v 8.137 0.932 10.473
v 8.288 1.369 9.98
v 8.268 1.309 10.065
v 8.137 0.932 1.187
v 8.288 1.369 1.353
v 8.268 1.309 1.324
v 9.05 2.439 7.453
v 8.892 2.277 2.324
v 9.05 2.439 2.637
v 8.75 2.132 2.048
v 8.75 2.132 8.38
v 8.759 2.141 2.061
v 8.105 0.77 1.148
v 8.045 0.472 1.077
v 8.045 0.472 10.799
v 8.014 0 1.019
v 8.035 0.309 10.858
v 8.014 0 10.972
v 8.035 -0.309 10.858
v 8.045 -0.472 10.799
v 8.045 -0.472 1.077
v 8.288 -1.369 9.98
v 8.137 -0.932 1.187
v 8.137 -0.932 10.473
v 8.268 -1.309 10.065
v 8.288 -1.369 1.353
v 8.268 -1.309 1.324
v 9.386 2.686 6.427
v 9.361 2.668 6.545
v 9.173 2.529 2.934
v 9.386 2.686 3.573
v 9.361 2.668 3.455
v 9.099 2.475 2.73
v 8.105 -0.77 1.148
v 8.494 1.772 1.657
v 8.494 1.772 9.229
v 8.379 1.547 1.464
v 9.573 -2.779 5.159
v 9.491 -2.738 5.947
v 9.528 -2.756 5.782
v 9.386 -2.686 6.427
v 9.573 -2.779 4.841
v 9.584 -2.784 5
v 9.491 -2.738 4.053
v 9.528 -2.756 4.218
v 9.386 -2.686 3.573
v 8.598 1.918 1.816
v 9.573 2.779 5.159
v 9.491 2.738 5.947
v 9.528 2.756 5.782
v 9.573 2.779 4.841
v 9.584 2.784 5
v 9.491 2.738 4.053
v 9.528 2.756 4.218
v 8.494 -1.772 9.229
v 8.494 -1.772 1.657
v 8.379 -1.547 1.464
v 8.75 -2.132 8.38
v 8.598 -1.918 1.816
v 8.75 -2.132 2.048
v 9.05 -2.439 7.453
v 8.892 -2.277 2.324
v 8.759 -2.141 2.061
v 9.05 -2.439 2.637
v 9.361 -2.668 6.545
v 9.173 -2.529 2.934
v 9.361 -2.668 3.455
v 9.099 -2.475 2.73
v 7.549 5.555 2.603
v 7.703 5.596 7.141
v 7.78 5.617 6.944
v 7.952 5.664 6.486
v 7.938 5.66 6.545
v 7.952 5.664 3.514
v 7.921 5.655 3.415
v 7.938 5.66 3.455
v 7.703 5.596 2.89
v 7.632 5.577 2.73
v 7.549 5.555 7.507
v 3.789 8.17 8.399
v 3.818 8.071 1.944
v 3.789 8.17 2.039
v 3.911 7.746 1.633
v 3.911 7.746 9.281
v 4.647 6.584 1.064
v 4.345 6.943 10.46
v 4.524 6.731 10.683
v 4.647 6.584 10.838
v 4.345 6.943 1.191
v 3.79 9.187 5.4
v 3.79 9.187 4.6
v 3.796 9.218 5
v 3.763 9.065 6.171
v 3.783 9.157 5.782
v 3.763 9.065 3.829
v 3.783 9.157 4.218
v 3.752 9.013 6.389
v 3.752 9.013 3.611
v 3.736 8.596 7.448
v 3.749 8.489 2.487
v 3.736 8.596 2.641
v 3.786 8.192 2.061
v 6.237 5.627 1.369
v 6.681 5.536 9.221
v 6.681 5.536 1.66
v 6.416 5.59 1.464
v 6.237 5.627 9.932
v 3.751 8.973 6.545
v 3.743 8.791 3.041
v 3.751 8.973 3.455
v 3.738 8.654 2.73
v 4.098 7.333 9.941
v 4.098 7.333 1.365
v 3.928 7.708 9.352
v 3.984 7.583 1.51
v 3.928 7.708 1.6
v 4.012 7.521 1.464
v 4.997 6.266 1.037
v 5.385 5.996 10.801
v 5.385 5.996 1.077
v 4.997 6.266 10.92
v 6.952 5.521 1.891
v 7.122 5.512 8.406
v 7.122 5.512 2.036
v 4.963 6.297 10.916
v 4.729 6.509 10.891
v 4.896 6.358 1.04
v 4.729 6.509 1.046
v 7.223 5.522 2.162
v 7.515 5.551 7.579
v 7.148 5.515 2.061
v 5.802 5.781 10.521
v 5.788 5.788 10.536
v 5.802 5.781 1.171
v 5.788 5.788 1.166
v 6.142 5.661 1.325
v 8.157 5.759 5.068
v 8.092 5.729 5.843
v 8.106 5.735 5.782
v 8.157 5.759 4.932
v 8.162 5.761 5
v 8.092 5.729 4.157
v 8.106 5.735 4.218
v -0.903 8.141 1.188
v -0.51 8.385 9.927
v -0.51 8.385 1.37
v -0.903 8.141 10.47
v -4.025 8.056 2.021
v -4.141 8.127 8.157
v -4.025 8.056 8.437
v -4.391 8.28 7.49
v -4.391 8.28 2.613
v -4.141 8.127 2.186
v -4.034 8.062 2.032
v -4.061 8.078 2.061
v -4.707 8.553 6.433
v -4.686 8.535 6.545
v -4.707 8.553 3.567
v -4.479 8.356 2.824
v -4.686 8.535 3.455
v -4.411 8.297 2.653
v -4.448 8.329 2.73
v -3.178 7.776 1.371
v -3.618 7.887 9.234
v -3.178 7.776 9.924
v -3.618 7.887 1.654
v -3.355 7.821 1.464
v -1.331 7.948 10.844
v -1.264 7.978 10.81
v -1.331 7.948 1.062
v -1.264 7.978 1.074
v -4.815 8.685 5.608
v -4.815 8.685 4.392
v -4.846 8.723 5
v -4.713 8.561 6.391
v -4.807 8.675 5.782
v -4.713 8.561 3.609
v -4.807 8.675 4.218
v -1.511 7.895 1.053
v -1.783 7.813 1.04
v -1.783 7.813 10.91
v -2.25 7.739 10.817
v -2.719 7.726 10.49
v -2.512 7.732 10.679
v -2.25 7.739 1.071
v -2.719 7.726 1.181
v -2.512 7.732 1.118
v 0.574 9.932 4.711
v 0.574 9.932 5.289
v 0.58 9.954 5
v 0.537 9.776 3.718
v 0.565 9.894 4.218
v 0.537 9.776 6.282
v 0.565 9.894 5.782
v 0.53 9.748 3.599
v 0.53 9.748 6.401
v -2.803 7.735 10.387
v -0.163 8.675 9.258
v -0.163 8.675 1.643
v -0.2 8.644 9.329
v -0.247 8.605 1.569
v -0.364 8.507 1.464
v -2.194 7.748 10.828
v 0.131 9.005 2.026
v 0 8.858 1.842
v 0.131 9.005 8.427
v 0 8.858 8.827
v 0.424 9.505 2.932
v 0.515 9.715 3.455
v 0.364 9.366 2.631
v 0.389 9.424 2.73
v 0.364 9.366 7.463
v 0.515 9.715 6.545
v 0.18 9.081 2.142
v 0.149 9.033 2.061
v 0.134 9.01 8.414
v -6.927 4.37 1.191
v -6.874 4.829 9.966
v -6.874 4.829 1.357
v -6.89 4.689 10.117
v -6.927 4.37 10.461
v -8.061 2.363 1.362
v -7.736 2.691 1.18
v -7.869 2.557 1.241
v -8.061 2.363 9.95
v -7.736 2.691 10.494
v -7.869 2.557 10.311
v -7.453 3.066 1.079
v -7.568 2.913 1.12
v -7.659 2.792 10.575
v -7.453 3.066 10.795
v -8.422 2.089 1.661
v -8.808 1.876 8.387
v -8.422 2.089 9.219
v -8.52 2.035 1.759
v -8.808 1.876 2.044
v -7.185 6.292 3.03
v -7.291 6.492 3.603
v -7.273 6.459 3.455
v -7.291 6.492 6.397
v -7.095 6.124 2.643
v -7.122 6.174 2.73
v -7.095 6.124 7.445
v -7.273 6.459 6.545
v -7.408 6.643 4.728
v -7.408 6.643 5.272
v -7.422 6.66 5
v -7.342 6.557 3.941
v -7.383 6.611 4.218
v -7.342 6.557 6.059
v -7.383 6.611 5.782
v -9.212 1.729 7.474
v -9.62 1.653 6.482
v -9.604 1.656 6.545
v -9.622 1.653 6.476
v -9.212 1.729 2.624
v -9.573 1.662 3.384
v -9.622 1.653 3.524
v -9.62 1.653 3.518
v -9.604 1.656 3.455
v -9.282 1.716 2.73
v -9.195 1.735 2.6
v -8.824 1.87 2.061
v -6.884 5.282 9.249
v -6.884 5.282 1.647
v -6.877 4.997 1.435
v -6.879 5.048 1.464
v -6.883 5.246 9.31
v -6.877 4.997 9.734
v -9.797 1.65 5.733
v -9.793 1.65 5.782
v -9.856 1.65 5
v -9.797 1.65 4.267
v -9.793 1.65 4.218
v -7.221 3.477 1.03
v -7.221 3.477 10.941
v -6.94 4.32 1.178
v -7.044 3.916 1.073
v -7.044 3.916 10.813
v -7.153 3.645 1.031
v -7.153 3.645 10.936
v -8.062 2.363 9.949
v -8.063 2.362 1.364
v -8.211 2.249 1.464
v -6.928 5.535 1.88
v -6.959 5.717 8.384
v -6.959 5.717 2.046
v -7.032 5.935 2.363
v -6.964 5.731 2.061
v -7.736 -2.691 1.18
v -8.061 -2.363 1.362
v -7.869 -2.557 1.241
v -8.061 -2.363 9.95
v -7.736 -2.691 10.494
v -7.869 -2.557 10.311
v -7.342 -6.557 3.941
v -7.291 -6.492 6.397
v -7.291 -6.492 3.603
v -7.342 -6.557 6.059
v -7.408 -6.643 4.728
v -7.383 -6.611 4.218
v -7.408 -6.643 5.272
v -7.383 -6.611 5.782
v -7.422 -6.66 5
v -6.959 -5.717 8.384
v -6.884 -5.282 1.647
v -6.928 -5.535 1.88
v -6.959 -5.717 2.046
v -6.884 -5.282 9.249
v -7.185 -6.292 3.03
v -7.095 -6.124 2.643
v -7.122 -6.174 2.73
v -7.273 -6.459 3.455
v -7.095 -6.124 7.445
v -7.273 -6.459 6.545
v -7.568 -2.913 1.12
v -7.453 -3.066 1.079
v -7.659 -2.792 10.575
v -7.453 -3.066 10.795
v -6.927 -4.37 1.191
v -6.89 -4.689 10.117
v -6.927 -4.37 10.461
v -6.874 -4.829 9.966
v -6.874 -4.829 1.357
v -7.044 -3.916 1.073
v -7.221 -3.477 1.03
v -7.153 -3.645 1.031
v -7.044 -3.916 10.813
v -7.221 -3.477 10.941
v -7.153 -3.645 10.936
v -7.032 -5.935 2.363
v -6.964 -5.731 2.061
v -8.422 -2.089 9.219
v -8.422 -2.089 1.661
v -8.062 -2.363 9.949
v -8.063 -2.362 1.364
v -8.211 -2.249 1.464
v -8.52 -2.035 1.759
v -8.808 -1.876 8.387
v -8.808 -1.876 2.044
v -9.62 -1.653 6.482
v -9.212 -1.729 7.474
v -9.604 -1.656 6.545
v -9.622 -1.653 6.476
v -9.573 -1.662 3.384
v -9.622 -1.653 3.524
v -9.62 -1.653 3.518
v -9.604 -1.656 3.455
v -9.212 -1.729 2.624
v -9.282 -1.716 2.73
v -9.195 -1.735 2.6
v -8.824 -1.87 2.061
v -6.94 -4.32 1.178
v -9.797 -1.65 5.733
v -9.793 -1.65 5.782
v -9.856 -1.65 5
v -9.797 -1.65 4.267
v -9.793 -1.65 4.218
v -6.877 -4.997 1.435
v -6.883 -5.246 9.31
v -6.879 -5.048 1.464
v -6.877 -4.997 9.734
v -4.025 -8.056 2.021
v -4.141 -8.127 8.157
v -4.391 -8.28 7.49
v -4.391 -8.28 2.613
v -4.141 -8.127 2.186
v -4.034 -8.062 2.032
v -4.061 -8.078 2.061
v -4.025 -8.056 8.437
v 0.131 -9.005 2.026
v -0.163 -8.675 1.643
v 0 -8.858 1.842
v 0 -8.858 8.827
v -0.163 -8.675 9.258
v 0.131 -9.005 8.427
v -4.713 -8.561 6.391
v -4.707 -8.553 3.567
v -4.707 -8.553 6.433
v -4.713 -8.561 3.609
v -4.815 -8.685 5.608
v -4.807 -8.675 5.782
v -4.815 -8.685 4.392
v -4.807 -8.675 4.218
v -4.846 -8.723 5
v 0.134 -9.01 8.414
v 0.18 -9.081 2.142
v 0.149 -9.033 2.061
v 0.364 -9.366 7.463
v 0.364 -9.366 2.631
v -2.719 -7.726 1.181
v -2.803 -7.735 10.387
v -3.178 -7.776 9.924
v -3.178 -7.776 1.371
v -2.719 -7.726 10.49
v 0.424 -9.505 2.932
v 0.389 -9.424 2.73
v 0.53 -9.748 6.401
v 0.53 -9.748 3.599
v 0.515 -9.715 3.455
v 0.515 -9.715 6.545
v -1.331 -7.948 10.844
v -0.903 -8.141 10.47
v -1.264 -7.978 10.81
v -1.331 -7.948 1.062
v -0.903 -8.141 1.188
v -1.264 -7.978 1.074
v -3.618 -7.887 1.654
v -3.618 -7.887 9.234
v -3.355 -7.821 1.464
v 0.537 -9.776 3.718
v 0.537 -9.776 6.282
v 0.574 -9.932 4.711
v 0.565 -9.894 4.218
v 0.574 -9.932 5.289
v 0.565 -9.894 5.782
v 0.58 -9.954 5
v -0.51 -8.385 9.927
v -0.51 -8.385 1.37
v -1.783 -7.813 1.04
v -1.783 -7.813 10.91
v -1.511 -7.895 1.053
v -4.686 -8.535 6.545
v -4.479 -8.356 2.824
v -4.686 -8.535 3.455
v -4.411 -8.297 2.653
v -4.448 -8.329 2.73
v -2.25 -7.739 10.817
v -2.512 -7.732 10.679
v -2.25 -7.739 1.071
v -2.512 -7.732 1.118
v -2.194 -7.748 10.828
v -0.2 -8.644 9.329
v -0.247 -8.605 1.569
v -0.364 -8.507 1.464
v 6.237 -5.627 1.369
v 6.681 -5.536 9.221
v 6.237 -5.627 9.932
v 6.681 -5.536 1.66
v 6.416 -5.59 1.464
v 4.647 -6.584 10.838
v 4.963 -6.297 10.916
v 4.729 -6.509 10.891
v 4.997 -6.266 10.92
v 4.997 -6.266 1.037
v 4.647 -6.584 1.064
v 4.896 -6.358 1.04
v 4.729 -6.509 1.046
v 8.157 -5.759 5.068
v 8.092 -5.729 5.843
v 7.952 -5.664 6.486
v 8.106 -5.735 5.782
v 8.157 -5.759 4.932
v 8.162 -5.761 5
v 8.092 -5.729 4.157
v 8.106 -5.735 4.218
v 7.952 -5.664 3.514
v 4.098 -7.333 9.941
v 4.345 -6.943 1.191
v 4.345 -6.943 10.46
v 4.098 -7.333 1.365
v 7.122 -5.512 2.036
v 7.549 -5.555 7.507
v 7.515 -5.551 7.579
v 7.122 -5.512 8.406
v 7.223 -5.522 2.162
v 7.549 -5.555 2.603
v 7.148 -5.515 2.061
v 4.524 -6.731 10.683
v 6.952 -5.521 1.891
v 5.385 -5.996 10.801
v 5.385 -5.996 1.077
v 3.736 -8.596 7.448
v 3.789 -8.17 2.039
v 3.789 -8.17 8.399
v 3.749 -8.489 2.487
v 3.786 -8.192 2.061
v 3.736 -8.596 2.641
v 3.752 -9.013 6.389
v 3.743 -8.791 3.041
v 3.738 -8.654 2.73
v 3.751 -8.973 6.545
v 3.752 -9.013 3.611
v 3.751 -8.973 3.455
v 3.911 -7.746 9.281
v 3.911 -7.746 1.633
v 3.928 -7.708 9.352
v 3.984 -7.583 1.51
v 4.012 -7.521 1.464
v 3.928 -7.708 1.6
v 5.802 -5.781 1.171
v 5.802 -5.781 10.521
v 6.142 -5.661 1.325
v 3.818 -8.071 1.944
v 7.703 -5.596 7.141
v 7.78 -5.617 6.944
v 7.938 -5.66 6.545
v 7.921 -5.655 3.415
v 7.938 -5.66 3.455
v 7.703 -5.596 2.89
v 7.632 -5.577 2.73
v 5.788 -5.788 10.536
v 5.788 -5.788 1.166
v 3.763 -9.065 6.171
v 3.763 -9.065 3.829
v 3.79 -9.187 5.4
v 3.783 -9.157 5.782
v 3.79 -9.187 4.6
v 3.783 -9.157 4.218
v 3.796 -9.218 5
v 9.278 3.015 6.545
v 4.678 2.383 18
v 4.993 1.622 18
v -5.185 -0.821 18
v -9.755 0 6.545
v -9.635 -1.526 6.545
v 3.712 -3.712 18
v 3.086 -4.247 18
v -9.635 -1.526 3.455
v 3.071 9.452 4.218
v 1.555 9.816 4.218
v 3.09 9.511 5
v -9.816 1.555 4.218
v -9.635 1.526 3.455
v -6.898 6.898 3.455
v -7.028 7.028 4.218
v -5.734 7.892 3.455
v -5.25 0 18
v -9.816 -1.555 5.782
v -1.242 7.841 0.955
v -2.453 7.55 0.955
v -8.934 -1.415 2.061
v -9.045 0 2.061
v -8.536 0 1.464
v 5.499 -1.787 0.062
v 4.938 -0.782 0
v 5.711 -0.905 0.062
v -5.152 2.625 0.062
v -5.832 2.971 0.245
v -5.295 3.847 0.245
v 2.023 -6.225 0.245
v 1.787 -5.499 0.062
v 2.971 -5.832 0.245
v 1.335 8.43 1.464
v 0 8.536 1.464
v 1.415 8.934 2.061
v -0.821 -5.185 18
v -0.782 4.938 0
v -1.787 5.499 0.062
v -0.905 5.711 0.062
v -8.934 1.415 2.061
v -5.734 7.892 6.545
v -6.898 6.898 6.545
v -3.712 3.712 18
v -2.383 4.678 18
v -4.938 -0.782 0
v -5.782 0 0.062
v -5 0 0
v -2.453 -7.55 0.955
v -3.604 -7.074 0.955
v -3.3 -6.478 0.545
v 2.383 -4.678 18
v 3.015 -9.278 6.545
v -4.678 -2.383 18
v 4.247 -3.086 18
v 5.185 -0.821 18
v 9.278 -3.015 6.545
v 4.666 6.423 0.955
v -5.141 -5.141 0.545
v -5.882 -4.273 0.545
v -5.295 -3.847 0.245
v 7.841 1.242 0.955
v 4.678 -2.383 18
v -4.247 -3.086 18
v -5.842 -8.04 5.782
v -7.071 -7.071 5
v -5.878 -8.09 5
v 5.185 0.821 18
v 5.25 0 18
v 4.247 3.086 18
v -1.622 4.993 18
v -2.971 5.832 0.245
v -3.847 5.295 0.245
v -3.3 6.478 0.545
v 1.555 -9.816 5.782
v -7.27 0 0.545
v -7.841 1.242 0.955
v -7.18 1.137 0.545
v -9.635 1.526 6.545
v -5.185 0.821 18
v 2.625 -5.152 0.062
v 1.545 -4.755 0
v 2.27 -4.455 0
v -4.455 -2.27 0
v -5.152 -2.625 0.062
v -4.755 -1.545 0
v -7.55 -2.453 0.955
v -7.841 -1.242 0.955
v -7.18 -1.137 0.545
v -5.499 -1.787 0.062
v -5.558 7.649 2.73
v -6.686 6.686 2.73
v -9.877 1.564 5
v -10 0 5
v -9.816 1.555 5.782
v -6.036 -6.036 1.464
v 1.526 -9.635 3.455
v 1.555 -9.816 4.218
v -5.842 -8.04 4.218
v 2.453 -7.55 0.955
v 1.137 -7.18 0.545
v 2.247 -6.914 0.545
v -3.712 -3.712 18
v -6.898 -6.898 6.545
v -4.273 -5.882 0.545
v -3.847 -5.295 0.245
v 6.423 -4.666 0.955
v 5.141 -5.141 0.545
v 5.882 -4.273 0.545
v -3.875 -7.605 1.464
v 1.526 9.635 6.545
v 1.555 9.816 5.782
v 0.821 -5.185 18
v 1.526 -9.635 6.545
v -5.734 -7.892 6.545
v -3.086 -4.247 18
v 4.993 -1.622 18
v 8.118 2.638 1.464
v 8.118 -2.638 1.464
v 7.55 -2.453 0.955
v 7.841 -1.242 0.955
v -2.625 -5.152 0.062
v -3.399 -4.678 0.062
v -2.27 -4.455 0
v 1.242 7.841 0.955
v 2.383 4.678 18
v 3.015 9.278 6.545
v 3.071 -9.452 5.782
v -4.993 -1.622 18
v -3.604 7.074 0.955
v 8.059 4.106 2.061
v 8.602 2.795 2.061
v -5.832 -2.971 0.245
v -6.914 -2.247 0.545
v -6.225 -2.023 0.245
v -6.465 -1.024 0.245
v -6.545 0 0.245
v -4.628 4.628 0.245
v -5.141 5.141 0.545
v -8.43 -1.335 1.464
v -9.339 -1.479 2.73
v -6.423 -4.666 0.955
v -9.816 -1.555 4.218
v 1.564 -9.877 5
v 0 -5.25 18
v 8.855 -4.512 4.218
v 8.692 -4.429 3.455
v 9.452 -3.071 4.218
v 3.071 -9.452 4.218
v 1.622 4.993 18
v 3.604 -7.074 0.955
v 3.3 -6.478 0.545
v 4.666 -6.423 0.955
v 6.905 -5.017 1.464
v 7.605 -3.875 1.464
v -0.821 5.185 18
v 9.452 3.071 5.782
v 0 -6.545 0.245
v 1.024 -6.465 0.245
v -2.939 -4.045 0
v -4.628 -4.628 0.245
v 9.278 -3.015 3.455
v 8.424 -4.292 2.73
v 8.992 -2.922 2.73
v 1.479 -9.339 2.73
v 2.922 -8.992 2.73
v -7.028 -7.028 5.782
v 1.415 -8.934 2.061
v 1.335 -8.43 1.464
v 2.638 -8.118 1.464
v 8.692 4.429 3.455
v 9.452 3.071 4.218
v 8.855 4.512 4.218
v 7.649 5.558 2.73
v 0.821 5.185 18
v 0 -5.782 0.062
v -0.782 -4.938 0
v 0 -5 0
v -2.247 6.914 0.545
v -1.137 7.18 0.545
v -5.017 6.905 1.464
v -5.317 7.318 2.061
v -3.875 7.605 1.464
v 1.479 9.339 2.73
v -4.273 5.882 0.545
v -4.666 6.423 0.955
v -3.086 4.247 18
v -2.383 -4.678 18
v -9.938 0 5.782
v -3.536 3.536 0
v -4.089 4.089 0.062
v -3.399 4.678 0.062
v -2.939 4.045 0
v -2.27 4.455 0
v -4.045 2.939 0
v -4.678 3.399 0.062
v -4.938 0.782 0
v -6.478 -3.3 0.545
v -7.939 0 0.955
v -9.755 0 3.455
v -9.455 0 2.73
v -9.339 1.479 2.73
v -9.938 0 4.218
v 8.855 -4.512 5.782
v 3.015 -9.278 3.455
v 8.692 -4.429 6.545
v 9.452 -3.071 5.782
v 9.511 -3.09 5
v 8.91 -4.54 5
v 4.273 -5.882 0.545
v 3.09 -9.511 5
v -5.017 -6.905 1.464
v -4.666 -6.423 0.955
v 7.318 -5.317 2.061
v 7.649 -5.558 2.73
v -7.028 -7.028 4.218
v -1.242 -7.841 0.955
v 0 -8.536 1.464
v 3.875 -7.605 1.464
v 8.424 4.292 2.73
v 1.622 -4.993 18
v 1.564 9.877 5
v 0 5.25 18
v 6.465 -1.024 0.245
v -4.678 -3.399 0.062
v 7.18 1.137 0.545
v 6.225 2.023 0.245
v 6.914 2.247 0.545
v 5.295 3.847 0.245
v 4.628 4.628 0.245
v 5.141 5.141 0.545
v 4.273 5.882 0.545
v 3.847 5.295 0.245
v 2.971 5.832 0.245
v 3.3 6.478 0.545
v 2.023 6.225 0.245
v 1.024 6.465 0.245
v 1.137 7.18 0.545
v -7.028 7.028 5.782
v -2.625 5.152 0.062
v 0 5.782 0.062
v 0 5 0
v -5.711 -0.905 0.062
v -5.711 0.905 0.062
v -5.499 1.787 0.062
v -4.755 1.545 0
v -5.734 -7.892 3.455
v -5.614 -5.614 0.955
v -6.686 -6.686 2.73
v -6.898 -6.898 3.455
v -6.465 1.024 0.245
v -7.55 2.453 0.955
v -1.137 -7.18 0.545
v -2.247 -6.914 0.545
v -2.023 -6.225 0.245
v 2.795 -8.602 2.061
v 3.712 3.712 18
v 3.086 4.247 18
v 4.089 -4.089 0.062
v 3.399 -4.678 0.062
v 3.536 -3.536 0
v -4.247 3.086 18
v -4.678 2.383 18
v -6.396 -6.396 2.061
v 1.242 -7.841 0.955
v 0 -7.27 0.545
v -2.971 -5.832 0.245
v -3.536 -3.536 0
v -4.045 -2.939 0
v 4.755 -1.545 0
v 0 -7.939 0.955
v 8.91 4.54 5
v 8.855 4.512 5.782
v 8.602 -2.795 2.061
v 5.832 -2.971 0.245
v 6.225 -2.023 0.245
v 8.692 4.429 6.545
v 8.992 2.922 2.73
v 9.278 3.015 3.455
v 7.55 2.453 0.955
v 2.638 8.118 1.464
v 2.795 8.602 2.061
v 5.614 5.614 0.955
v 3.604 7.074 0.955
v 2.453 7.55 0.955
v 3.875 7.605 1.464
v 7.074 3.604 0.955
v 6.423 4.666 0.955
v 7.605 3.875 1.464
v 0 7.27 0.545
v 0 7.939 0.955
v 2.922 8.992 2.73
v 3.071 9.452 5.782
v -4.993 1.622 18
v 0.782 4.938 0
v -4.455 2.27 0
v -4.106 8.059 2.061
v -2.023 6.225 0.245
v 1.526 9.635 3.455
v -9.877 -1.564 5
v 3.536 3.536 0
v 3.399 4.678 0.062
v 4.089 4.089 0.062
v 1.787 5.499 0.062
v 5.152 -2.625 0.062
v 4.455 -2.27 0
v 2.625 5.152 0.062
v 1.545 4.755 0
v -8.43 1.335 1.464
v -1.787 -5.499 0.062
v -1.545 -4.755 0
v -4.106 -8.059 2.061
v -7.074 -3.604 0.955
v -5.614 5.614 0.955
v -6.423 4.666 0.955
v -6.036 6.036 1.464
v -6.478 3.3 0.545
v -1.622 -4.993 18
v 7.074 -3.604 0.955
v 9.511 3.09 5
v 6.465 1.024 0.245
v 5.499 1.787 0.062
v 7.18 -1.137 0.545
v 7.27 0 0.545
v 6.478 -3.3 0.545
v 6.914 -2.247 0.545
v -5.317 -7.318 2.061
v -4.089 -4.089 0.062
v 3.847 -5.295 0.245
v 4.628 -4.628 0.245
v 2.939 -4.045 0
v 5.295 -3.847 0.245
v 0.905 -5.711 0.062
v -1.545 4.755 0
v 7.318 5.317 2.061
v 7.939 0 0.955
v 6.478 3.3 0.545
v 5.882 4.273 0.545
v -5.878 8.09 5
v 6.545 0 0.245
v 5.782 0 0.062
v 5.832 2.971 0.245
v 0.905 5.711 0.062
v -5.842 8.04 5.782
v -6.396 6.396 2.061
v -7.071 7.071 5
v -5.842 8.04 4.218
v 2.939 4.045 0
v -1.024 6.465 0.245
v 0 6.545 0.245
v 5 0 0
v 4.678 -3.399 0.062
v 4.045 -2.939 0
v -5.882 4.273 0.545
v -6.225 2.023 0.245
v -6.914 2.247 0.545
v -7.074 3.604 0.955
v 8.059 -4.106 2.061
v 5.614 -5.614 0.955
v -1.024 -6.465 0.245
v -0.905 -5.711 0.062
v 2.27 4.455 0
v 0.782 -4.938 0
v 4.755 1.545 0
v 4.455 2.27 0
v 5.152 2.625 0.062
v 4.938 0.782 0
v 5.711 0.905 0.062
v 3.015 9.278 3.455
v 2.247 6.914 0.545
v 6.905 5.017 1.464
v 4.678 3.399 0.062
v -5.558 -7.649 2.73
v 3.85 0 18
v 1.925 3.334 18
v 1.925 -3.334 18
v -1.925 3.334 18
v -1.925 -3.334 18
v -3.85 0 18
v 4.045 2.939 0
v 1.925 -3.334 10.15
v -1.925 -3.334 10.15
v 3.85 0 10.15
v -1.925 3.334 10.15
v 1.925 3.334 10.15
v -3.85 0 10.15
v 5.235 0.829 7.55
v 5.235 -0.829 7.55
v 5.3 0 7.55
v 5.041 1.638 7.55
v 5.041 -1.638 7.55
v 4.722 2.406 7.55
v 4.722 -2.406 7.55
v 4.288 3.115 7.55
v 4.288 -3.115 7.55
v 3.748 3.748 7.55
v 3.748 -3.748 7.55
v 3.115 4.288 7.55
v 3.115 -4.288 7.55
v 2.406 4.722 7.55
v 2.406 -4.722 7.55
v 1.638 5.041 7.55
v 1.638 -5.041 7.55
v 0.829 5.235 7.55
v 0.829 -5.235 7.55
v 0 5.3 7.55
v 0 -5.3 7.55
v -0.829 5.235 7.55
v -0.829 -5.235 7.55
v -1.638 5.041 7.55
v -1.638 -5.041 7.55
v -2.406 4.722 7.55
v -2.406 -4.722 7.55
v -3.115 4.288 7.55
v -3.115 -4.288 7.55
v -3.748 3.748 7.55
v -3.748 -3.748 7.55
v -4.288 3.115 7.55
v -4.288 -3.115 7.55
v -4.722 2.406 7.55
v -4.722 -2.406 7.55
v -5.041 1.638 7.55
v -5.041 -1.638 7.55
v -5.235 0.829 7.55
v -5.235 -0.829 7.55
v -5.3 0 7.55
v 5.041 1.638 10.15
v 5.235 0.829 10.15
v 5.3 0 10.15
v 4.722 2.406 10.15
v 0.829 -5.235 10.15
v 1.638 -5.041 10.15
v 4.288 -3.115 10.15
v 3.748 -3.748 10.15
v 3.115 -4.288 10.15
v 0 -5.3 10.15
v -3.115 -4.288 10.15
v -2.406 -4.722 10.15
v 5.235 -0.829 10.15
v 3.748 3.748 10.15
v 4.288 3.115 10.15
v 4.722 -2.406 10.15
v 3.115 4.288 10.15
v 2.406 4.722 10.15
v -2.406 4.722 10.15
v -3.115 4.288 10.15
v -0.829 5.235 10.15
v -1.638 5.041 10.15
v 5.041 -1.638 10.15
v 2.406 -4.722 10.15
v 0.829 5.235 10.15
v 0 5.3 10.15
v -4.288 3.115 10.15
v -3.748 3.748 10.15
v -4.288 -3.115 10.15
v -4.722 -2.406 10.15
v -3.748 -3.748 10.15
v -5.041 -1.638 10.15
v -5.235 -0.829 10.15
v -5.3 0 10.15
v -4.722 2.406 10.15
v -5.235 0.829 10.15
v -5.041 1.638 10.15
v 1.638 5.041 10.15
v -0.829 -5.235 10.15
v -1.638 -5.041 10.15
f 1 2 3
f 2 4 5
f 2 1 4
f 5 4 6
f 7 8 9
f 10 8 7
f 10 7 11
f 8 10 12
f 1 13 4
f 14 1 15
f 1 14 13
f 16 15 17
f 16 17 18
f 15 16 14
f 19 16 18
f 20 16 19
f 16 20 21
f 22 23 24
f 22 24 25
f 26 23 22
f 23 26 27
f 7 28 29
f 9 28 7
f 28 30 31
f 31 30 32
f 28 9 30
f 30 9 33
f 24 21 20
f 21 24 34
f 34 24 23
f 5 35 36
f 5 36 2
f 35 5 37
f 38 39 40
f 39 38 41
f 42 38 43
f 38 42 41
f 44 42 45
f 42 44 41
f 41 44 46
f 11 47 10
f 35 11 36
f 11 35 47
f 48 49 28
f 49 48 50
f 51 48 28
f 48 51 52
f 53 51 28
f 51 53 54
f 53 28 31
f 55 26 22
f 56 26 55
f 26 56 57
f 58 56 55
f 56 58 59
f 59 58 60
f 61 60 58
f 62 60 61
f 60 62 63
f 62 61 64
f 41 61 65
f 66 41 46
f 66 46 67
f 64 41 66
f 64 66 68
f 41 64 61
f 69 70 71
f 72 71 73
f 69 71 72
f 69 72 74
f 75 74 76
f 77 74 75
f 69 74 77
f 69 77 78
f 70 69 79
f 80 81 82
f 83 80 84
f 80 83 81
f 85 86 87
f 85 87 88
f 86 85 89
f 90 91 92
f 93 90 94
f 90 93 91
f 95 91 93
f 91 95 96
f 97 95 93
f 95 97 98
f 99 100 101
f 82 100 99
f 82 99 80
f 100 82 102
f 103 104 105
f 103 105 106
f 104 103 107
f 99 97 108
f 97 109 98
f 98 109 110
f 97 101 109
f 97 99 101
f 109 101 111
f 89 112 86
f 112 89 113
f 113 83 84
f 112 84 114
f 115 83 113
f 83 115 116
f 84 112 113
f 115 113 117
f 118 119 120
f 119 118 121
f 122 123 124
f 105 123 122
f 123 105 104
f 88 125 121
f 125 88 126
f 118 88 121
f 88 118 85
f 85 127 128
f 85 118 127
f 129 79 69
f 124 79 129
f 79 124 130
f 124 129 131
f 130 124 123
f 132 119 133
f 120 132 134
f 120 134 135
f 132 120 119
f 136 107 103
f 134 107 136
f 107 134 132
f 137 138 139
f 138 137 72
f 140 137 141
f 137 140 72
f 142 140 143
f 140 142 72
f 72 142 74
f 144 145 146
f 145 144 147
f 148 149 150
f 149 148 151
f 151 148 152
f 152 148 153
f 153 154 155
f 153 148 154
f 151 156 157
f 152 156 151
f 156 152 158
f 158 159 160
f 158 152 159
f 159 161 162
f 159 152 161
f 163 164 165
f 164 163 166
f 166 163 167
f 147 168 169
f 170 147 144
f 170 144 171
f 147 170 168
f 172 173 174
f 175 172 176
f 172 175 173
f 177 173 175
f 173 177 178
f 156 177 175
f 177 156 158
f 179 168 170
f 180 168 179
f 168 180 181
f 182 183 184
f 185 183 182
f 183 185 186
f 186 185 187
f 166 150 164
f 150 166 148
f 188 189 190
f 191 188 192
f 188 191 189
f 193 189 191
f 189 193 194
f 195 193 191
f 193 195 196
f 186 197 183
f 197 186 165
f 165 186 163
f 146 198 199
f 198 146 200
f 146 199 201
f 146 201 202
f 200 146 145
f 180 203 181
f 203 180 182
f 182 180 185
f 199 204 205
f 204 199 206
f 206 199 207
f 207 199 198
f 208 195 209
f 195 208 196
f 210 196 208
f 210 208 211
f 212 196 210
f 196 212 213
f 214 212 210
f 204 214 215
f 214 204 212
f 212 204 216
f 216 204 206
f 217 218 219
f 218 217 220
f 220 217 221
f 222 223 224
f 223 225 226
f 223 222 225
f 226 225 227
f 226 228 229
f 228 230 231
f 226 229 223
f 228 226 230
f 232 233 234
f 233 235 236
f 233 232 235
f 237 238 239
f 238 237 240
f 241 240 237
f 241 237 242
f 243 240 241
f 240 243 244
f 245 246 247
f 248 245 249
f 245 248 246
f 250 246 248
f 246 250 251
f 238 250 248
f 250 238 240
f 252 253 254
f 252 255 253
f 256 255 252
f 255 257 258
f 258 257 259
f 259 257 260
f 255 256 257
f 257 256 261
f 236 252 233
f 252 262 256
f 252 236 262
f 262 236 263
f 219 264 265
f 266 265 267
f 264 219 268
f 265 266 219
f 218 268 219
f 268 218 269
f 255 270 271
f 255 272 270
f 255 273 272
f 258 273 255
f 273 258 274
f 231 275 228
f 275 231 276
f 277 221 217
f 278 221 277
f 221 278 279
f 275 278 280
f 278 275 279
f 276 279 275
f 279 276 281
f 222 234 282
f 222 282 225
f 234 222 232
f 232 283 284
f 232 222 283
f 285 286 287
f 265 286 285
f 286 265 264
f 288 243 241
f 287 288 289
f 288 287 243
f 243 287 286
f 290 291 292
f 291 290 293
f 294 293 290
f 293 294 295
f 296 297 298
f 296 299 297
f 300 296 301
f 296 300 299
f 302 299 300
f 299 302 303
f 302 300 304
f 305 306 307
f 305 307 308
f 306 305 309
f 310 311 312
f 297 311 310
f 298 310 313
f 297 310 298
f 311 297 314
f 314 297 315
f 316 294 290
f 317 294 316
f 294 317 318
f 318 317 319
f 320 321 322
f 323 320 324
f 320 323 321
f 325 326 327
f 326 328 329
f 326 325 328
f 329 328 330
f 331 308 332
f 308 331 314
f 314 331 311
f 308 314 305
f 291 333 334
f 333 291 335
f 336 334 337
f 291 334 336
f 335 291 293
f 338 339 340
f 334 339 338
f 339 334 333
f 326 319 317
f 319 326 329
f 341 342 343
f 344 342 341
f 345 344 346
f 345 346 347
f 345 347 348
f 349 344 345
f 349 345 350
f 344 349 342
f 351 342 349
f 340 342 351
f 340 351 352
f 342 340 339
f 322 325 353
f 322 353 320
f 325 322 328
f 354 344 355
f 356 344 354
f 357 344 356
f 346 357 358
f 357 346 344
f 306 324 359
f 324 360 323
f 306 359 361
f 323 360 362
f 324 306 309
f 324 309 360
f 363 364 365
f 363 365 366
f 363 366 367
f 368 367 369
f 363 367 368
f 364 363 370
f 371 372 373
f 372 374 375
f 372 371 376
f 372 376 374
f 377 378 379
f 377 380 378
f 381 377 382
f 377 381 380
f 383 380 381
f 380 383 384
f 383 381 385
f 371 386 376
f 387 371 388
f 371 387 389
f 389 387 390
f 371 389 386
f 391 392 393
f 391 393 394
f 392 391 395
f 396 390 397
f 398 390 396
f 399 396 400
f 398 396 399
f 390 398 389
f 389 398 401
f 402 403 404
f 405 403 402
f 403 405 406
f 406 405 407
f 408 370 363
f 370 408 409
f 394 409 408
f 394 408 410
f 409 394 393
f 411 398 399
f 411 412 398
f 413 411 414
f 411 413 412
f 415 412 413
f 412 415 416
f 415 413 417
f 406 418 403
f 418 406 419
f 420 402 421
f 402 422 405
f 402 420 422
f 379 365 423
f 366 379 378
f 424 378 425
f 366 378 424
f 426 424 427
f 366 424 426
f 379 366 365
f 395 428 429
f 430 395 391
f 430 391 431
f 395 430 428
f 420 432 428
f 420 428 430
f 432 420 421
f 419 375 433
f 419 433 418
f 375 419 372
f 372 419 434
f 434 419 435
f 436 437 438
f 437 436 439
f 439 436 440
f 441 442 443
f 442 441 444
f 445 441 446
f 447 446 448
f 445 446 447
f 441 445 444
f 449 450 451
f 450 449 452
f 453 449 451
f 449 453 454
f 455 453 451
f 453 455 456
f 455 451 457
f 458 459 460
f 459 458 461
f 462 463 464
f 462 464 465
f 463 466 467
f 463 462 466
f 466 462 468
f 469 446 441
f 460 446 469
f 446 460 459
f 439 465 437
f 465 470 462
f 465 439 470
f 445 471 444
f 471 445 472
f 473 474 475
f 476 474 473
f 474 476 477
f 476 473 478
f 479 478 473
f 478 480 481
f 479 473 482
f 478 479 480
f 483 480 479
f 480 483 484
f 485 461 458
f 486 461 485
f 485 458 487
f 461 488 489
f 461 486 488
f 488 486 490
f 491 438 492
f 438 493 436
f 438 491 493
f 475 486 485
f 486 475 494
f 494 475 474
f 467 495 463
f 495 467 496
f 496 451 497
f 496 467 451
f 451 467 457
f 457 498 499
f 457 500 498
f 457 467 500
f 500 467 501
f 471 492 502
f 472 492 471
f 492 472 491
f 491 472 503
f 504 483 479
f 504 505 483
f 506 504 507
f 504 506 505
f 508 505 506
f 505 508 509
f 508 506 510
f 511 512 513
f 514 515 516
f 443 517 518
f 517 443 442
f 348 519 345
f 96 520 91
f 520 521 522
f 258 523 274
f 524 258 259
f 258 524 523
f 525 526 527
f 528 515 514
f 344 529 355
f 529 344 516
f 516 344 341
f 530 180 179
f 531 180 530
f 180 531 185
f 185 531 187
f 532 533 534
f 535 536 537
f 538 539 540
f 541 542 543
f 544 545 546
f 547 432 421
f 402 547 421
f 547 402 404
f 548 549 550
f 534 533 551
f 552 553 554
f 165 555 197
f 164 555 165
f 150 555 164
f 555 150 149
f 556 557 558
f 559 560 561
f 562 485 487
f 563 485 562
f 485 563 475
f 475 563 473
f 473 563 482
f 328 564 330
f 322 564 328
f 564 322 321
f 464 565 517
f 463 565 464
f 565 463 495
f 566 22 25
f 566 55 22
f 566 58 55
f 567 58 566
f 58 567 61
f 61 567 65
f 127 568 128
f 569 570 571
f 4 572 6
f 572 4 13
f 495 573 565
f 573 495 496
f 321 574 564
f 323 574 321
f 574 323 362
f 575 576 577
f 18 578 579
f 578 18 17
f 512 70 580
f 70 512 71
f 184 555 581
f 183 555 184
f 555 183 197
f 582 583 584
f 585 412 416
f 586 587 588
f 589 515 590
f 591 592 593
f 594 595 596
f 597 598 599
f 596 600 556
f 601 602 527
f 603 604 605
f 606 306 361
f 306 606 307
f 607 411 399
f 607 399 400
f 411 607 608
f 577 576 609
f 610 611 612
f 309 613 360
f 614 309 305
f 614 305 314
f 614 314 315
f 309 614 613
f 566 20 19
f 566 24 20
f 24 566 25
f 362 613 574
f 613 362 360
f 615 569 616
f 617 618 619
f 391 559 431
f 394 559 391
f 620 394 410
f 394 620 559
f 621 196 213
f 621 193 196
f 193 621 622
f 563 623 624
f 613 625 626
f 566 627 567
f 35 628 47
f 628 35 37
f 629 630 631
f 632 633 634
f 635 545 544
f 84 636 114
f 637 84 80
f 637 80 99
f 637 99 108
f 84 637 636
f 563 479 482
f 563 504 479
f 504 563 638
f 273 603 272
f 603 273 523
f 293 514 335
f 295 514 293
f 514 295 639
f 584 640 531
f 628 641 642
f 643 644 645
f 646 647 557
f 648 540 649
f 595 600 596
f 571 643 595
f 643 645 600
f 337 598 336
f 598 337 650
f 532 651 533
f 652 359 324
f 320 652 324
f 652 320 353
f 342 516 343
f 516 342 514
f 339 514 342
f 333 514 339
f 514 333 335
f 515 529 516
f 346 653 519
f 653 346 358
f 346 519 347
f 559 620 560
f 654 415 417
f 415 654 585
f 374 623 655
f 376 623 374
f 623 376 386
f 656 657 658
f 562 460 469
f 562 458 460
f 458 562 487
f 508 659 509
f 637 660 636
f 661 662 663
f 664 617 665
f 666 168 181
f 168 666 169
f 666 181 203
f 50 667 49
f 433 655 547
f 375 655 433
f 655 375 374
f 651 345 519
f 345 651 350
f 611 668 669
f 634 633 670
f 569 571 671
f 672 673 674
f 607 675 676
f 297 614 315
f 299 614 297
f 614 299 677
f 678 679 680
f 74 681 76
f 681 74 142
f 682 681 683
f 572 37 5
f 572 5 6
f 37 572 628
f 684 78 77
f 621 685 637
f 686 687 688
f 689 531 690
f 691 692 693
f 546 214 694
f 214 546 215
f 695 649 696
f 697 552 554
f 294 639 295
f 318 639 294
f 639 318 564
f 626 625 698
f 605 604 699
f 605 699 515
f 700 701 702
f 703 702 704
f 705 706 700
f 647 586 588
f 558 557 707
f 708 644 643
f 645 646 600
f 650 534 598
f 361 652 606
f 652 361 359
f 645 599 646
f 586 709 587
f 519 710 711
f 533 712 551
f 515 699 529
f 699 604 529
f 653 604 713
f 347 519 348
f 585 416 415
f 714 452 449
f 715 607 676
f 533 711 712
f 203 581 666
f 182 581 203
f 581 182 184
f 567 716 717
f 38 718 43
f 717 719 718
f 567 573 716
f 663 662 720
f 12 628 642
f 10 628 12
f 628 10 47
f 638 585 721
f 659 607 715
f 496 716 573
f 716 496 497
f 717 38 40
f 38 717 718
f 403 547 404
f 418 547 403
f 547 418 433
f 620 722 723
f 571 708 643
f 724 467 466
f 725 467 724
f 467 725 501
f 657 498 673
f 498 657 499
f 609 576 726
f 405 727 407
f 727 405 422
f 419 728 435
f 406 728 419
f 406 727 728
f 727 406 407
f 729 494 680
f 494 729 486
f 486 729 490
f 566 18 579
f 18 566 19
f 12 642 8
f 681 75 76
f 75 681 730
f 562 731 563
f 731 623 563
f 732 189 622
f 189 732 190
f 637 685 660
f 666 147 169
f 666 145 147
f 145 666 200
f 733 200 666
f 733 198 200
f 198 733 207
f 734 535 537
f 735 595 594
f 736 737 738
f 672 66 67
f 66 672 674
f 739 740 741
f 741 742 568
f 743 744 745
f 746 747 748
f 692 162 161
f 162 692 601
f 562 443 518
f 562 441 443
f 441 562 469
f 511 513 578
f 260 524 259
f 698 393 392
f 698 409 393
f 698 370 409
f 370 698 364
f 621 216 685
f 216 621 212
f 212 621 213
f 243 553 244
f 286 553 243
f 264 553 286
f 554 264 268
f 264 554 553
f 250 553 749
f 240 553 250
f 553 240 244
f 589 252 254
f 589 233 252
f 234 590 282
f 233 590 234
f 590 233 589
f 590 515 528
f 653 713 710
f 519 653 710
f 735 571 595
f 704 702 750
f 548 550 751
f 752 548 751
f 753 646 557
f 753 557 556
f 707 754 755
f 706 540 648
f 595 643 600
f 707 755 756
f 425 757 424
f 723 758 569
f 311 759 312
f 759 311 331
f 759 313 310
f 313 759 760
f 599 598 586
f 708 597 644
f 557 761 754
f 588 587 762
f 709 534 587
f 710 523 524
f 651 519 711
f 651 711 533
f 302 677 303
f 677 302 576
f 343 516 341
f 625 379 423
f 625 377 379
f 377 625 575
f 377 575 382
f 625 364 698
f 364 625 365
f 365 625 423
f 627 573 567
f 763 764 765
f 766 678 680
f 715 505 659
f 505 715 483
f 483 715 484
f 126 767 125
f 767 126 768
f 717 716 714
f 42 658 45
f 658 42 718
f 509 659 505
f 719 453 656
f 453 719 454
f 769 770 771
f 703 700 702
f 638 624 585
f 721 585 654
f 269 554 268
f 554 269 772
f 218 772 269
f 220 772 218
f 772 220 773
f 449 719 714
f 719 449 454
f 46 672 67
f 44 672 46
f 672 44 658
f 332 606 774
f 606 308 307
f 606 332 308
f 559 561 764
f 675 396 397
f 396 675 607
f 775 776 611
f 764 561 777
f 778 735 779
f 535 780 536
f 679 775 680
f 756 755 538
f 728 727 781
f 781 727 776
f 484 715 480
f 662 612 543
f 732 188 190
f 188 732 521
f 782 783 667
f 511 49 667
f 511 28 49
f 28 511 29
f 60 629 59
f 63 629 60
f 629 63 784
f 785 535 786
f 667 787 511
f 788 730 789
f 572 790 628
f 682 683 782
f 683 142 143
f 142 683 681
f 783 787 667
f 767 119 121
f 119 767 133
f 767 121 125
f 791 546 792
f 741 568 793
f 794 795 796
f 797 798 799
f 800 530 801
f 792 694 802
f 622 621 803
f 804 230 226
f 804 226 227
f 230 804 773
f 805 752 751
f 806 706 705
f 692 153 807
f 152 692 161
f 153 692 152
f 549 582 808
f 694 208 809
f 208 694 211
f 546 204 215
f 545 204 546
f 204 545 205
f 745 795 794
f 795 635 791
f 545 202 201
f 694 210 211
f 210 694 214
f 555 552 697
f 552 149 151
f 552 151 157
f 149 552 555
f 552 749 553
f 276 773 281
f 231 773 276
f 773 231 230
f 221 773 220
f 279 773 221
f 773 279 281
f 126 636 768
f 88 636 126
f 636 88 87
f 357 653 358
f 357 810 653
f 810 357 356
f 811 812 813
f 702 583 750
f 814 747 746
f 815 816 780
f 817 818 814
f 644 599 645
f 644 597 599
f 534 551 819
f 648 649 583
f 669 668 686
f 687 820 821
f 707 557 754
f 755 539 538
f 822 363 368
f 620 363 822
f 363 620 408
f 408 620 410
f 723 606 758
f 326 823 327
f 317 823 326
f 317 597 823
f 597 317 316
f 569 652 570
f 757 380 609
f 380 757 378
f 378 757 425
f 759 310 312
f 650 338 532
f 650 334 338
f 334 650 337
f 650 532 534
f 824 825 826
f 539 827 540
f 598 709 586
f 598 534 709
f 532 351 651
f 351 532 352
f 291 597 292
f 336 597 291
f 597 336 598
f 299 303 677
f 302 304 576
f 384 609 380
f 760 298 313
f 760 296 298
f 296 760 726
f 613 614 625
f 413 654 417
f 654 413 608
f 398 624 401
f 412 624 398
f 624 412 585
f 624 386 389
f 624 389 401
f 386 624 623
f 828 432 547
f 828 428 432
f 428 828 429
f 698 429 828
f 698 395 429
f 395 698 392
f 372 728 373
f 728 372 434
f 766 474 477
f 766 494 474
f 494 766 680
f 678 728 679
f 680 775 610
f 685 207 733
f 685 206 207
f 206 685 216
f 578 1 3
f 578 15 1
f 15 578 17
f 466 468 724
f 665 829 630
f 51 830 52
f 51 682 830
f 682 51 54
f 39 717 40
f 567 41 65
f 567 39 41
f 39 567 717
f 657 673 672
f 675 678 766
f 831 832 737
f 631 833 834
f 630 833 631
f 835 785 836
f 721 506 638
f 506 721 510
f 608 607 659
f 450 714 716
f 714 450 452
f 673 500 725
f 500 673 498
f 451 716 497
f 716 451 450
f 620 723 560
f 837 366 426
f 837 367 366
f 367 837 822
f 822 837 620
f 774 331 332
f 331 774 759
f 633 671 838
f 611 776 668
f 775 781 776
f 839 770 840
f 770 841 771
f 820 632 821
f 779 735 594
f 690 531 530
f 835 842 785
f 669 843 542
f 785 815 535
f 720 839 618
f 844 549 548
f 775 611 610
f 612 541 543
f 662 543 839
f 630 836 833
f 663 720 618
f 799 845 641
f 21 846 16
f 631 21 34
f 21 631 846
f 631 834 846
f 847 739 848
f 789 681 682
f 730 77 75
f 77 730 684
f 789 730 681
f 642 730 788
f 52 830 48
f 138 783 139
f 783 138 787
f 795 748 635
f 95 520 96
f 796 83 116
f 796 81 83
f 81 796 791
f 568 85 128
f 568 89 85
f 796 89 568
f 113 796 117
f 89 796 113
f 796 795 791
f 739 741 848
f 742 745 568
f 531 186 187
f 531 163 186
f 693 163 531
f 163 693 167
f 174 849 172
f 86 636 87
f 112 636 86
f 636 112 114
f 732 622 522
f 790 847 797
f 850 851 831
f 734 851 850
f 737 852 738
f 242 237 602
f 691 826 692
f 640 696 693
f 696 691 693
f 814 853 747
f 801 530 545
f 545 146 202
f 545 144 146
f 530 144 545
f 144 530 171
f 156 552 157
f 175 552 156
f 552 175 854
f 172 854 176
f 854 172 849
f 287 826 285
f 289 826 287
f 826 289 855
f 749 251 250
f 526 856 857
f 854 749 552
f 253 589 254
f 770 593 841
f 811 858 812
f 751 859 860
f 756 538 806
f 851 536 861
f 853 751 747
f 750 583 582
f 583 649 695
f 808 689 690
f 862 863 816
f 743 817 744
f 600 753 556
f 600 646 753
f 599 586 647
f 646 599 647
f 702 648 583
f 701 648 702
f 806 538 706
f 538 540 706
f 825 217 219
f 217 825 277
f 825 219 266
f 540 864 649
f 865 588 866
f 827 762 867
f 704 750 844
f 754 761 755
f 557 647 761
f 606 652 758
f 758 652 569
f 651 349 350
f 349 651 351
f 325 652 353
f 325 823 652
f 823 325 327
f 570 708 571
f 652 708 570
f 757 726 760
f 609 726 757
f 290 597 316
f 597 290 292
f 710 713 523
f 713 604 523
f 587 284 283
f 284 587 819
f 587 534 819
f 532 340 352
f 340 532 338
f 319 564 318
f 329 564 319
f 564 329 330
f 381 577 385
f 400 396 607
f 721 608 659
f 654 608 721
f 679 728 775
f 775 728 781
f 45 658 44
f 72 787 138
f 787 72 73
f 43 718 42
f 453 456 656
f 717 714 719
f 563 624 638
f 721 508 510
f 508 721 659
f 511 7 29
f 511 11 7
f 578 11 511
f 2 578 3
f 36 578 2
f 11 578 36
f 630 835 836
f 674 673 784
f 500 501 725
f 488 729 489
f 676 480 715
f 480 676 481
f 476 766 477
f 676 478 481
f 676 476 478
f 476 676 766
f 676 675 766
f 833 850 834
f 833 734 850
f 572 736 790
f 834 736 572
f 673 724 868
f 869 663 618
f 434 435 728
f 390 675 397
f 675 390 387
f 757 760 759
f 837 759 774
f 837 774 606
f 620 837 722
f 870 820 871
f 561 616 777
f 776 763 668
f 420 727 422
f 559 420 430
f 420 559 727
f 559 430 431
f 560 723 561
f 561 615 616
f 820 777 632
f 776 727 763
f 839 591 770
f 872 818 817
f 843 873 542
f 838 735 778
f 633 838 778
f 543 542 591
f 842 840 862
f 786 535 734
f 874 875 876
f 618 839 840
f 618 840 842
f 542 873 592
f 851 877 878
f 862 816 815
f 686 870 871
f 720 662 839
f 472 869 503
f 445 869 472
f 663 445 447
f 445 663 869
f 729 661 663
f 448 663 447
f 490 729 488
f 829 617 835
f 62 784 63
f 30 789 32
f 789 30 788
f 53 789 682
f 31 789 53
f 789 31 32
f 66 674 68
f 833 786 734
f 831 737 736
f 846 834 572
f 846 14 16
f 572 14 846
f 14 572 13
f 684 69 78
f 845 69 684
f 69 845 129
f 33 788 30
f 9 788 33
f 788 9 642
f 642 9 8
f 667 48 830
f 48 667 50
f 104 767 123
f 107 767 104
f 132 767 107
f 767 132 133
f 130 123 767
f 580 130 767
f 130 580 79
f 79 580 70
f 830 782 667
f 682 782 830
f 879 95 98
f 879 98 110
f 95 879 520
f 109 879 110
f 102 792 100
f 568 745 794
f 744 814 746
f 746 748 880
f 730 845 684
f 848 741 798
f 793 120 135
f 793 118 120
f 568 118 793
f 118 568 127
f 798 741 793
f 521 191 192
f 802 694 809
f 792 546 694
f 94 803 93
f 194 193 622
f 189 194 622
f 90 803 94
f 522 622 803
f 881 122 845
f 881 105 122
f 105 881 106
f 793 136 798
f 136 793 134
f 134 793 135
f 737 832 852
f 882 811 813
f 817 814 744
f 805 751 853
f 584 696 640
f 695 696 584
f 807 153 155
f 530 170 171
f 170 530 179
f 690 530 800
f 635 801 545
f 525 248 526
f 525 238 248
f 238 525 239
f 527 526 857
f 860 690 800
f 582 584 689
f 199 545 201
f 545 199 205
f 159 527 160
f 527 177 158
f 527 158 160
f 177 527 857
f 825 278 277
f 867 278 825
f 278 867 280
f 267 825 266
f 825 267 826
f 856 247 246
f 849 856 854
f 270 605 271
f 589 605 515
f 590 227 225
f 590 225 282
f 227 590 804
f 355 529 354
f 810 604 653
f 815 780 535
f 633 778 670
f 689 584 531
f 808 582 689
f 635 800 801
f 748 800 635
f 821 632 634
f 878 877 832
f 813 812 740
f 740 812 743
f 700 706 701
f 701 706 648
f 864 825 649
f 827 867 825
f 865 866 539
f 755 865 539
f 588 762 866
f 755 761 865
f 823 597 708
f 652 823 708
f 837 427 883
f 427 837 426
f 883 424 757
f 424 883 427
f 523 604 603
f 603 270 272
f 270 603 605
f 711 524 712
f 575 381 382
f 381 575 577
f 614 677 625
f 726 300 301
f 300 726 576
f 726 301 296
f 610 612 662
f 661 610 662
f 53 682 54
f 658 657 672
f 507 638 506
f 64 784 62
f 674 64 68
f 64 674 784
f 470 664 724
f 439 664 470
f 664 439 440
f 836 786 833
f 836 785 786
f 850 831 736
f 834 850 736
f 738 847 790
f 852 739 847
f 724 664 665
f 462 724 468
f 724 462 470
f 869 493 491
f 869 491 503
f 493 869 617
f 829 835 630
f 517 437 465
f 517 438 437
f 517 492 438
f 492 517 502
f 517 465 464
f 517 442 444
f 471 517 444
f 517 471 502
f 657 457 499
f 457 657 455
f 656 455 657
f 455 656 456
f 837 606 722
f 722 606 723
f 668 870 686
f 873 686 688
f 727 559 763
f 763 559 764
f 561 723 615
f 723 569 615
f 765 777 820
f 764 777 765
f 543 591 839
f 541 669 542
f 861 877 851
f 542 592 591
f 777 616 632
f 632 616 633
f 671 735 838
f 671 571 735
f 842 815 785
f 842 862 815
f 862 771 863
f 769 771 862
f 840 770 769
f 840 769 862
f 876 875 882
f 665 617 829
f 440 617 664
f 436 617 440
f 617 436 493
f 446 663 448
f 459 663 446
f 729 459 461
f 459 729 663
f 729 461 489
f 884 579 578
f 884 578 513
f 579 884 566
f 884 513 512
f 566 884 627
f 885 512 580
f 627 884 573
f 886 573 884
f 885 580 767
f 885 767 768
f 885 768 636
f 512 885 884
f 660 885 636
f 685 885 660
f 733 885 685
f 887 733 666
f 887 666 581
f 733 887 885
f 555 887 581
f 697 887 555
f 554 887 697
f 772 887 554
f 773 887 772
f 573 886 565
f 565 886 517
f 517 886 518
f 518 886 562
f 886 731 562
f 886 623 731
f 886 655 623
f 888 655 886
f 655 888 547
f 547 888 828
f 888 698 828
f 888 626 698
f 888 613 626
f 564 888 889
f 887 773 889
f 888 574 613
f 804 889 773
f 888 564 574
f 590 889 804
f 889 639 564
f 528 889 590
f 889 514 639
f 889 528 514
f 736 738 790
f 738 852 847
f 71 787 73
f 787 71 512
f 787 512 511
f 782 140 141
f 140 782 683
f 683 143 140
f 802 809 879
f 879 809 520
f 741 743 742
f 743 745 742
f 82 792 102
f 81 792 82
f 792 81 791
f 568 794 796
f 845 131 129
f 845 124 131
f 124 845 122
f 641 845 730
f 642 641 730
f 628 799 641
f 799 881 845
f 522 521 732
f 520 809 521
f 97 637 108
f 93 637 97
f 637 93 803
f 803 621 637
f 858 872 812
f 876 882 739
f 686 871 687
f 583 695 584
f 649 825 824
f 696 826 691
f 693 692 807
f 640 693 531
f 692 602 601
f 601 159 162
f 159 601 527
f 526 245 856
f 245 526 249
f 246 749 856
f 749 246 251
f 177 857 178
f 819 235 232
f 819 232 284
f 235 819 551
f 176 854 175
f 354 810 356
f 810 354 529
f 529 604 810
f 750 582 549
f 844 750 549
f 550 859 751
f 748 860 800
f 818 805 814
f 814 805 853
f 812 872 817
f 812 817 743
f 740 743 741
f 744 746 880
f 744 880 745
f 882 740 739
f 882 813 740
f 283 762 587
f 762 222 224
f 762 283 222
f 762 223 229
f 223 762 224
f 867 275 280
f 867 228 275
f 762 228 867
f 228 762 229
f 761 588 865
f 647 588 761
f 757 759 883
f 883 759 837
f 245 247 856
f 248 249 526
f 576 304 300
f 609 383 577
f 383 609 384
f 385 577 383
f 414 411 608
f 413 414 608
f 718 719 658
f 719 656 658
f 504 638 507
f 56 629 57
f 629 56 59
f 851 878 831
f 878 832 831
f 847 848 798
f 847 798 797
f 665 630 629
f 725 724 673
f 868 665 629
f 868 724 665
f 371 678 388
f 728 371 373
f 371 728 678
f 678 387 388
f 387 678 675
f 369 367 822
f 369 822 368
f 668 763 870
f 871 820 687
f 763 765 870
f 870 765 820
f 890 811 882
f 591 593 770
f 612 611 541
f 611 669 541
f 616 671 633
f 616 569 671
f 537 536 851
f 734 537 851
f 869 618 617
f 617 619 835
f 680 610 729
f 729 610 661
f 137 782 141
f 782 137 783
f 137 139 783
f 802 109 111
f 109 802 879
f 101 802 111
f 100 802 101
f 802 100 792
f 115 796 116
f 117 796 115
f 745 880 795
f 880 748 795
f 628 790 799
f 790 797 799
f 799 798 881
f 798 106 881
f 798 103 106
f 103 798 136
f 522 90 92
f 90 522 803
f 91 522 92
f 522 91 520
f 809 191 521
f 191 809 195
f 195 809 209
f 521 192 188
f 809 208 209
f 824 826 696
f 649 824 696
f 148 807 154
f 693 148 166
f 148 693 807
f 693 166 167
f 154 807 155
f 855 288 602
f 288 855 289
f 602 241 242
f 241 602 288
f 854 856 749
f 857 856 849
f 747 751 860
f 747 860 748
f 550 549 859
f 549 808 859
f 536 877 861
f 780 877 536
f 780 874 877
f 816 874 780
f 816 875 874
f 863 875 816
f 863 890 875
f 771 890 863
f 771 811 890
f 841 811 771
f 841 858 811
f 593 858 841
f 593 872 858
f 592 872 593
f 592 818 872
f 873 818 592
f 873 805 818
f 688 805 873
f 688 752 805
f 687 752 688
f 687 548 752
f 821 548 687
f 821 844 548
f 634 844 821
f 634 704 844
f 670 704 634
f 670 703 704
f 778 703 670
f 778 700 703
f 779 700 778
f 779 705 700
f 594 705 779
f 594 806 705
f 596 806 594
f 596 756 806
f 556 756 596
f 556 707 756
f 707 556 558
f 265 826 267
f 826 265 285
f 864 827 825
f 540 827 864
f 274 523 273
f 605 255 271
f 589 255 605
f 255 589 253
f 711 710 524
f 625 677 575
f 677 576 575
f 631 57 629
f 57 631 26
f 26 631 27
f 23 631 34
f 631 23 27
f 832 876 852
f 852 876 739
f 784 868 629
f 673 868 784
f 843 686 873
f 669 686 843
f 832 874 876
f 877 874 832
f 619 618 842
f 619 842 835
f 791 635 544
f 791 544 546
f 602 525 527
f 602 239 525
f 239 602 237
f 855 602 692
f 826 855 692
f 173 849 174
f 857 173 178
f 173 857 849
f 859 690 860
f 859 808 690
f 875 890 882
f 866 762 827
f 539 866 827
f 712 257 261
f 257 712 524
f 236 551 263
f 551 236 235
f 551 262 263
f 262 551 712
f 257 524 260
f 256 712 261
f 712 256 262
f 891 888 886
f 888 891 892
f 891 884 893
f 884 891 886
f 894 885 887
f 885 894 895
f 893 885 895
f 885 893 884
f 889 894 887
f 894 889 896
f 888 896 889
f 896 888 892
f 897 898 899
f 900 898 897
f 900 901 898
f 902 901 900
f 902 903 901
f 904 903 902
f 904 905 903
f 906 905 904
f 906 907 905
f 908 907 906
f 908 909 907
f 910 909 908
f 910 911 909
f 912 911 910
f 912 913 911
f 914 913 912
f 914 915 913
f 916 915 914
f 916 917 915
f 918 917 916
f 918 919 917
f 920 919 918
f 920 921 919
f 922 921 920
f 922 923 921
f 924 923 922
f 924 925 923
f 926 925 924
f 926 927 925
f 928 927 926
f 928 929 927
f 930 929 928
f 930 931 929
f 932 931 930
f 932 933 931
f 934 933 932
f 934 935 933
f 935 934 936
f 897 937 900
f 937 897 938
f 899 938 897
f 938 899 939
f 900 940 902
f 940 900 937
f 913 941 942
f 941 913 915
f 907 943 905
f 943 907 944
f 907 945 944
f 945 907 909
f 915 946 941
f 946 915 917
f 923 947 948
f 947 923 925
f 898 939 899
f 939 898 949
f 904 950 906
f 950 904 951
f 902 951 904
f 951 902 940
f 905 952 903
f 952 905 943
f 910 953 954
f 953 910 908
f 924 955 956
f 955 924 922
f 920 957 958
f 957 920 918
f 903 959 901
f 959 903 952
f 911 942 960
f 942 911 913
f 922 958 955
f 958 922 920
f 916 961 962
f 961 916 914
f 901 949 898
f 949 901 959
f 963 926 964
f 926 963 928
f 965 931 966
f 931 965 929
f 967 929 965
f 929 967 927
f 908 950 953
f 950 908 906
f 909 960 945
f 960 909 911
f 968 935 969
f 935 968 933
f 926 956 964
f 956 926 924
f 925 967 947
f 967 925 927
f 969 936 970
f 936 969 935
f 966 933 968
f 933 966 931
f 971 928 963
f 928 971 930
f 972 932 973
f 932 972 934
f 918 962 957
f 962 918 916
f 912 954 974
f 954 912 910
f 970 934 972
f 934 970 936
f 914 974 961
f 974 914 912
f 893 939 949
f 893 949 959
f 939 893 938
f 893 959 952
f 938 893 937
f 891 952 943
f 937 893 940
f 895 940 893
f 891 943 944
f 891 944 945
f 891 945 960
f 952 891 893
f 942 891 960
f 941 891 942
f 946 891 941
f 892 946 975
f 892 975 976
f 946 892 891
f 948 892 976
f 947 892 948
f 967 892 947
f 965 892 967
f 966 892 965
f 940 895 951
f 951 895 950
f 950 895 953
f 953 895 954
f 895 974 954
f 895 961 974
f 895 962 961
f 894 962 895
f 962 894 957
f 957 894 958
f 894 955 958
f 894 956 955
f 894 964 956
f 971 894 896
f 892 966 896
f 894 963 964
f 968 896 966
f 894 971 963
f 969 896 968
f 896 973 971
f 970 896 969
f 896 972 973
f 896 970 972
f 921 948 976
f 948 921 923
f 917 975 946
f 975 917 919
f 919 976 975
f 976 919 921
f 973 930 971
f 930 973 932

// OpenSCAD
/* [Handle settings] */
//screwriver height
sdh=18;//[18:1:100]

//screwdriver diameter
sdd=20;//[20:0.5:50]

/* [Magnet settings] */
//magnet option
mo=1;//[0:No,1:Yes]

//magnet shape
mshape=0;//[0:round,1:square]

//magnet size (square side or circle diameter)
msize=10;//[5:0.5:10]

//magnet thickness
mt=2;//[1:0.5:6]

/* [Tuning] */
definition=40;//[40:Low,70:Medium,100:High]
//positve value will add gaps for bit and magnet
tolerance=0.15;
/////////

$fn=definition;

//screwdriver
module screwdriver(a){
    difference() {
        rotate([180,0,0])rotate_extrude() rotate([0,0,-90])
        hull() {
            translate([sdh-5.25,0,0]) square(5.25);
            square(1);
            translate([5,sdd/2-5,0]) circle(5);
            translate([sdh-13,sdd/2-5,0]) circle(5);
        }
        for(i=[0:360/7:360]) rotate([0,0,i]) translate([sdd/1.9,0,0]) scale([1,1.2,1]) cylinder(d=2*3.14*sdd/25,h=sdh);
            translate([0,0,sdh-0.2]) cylinder(d=7.4+2*tolerance,h=16,center=true,$fn=6);
        
        //magnet option
        translate([0,0,sdh-8-mt/2-tolerance]) if(a==1) {
            if(mshape==0) {
                cylinder(d=msize+4*tolerance,h=mt+4*tolerance,center=true);
            }
            else if(mshape==1) {
                cube([msize+4*tolerance,msize+4*tolerance,mt+2*tolerance],center=true);
            }
        }
        else {}
    }

}
screwdriver(mo);
